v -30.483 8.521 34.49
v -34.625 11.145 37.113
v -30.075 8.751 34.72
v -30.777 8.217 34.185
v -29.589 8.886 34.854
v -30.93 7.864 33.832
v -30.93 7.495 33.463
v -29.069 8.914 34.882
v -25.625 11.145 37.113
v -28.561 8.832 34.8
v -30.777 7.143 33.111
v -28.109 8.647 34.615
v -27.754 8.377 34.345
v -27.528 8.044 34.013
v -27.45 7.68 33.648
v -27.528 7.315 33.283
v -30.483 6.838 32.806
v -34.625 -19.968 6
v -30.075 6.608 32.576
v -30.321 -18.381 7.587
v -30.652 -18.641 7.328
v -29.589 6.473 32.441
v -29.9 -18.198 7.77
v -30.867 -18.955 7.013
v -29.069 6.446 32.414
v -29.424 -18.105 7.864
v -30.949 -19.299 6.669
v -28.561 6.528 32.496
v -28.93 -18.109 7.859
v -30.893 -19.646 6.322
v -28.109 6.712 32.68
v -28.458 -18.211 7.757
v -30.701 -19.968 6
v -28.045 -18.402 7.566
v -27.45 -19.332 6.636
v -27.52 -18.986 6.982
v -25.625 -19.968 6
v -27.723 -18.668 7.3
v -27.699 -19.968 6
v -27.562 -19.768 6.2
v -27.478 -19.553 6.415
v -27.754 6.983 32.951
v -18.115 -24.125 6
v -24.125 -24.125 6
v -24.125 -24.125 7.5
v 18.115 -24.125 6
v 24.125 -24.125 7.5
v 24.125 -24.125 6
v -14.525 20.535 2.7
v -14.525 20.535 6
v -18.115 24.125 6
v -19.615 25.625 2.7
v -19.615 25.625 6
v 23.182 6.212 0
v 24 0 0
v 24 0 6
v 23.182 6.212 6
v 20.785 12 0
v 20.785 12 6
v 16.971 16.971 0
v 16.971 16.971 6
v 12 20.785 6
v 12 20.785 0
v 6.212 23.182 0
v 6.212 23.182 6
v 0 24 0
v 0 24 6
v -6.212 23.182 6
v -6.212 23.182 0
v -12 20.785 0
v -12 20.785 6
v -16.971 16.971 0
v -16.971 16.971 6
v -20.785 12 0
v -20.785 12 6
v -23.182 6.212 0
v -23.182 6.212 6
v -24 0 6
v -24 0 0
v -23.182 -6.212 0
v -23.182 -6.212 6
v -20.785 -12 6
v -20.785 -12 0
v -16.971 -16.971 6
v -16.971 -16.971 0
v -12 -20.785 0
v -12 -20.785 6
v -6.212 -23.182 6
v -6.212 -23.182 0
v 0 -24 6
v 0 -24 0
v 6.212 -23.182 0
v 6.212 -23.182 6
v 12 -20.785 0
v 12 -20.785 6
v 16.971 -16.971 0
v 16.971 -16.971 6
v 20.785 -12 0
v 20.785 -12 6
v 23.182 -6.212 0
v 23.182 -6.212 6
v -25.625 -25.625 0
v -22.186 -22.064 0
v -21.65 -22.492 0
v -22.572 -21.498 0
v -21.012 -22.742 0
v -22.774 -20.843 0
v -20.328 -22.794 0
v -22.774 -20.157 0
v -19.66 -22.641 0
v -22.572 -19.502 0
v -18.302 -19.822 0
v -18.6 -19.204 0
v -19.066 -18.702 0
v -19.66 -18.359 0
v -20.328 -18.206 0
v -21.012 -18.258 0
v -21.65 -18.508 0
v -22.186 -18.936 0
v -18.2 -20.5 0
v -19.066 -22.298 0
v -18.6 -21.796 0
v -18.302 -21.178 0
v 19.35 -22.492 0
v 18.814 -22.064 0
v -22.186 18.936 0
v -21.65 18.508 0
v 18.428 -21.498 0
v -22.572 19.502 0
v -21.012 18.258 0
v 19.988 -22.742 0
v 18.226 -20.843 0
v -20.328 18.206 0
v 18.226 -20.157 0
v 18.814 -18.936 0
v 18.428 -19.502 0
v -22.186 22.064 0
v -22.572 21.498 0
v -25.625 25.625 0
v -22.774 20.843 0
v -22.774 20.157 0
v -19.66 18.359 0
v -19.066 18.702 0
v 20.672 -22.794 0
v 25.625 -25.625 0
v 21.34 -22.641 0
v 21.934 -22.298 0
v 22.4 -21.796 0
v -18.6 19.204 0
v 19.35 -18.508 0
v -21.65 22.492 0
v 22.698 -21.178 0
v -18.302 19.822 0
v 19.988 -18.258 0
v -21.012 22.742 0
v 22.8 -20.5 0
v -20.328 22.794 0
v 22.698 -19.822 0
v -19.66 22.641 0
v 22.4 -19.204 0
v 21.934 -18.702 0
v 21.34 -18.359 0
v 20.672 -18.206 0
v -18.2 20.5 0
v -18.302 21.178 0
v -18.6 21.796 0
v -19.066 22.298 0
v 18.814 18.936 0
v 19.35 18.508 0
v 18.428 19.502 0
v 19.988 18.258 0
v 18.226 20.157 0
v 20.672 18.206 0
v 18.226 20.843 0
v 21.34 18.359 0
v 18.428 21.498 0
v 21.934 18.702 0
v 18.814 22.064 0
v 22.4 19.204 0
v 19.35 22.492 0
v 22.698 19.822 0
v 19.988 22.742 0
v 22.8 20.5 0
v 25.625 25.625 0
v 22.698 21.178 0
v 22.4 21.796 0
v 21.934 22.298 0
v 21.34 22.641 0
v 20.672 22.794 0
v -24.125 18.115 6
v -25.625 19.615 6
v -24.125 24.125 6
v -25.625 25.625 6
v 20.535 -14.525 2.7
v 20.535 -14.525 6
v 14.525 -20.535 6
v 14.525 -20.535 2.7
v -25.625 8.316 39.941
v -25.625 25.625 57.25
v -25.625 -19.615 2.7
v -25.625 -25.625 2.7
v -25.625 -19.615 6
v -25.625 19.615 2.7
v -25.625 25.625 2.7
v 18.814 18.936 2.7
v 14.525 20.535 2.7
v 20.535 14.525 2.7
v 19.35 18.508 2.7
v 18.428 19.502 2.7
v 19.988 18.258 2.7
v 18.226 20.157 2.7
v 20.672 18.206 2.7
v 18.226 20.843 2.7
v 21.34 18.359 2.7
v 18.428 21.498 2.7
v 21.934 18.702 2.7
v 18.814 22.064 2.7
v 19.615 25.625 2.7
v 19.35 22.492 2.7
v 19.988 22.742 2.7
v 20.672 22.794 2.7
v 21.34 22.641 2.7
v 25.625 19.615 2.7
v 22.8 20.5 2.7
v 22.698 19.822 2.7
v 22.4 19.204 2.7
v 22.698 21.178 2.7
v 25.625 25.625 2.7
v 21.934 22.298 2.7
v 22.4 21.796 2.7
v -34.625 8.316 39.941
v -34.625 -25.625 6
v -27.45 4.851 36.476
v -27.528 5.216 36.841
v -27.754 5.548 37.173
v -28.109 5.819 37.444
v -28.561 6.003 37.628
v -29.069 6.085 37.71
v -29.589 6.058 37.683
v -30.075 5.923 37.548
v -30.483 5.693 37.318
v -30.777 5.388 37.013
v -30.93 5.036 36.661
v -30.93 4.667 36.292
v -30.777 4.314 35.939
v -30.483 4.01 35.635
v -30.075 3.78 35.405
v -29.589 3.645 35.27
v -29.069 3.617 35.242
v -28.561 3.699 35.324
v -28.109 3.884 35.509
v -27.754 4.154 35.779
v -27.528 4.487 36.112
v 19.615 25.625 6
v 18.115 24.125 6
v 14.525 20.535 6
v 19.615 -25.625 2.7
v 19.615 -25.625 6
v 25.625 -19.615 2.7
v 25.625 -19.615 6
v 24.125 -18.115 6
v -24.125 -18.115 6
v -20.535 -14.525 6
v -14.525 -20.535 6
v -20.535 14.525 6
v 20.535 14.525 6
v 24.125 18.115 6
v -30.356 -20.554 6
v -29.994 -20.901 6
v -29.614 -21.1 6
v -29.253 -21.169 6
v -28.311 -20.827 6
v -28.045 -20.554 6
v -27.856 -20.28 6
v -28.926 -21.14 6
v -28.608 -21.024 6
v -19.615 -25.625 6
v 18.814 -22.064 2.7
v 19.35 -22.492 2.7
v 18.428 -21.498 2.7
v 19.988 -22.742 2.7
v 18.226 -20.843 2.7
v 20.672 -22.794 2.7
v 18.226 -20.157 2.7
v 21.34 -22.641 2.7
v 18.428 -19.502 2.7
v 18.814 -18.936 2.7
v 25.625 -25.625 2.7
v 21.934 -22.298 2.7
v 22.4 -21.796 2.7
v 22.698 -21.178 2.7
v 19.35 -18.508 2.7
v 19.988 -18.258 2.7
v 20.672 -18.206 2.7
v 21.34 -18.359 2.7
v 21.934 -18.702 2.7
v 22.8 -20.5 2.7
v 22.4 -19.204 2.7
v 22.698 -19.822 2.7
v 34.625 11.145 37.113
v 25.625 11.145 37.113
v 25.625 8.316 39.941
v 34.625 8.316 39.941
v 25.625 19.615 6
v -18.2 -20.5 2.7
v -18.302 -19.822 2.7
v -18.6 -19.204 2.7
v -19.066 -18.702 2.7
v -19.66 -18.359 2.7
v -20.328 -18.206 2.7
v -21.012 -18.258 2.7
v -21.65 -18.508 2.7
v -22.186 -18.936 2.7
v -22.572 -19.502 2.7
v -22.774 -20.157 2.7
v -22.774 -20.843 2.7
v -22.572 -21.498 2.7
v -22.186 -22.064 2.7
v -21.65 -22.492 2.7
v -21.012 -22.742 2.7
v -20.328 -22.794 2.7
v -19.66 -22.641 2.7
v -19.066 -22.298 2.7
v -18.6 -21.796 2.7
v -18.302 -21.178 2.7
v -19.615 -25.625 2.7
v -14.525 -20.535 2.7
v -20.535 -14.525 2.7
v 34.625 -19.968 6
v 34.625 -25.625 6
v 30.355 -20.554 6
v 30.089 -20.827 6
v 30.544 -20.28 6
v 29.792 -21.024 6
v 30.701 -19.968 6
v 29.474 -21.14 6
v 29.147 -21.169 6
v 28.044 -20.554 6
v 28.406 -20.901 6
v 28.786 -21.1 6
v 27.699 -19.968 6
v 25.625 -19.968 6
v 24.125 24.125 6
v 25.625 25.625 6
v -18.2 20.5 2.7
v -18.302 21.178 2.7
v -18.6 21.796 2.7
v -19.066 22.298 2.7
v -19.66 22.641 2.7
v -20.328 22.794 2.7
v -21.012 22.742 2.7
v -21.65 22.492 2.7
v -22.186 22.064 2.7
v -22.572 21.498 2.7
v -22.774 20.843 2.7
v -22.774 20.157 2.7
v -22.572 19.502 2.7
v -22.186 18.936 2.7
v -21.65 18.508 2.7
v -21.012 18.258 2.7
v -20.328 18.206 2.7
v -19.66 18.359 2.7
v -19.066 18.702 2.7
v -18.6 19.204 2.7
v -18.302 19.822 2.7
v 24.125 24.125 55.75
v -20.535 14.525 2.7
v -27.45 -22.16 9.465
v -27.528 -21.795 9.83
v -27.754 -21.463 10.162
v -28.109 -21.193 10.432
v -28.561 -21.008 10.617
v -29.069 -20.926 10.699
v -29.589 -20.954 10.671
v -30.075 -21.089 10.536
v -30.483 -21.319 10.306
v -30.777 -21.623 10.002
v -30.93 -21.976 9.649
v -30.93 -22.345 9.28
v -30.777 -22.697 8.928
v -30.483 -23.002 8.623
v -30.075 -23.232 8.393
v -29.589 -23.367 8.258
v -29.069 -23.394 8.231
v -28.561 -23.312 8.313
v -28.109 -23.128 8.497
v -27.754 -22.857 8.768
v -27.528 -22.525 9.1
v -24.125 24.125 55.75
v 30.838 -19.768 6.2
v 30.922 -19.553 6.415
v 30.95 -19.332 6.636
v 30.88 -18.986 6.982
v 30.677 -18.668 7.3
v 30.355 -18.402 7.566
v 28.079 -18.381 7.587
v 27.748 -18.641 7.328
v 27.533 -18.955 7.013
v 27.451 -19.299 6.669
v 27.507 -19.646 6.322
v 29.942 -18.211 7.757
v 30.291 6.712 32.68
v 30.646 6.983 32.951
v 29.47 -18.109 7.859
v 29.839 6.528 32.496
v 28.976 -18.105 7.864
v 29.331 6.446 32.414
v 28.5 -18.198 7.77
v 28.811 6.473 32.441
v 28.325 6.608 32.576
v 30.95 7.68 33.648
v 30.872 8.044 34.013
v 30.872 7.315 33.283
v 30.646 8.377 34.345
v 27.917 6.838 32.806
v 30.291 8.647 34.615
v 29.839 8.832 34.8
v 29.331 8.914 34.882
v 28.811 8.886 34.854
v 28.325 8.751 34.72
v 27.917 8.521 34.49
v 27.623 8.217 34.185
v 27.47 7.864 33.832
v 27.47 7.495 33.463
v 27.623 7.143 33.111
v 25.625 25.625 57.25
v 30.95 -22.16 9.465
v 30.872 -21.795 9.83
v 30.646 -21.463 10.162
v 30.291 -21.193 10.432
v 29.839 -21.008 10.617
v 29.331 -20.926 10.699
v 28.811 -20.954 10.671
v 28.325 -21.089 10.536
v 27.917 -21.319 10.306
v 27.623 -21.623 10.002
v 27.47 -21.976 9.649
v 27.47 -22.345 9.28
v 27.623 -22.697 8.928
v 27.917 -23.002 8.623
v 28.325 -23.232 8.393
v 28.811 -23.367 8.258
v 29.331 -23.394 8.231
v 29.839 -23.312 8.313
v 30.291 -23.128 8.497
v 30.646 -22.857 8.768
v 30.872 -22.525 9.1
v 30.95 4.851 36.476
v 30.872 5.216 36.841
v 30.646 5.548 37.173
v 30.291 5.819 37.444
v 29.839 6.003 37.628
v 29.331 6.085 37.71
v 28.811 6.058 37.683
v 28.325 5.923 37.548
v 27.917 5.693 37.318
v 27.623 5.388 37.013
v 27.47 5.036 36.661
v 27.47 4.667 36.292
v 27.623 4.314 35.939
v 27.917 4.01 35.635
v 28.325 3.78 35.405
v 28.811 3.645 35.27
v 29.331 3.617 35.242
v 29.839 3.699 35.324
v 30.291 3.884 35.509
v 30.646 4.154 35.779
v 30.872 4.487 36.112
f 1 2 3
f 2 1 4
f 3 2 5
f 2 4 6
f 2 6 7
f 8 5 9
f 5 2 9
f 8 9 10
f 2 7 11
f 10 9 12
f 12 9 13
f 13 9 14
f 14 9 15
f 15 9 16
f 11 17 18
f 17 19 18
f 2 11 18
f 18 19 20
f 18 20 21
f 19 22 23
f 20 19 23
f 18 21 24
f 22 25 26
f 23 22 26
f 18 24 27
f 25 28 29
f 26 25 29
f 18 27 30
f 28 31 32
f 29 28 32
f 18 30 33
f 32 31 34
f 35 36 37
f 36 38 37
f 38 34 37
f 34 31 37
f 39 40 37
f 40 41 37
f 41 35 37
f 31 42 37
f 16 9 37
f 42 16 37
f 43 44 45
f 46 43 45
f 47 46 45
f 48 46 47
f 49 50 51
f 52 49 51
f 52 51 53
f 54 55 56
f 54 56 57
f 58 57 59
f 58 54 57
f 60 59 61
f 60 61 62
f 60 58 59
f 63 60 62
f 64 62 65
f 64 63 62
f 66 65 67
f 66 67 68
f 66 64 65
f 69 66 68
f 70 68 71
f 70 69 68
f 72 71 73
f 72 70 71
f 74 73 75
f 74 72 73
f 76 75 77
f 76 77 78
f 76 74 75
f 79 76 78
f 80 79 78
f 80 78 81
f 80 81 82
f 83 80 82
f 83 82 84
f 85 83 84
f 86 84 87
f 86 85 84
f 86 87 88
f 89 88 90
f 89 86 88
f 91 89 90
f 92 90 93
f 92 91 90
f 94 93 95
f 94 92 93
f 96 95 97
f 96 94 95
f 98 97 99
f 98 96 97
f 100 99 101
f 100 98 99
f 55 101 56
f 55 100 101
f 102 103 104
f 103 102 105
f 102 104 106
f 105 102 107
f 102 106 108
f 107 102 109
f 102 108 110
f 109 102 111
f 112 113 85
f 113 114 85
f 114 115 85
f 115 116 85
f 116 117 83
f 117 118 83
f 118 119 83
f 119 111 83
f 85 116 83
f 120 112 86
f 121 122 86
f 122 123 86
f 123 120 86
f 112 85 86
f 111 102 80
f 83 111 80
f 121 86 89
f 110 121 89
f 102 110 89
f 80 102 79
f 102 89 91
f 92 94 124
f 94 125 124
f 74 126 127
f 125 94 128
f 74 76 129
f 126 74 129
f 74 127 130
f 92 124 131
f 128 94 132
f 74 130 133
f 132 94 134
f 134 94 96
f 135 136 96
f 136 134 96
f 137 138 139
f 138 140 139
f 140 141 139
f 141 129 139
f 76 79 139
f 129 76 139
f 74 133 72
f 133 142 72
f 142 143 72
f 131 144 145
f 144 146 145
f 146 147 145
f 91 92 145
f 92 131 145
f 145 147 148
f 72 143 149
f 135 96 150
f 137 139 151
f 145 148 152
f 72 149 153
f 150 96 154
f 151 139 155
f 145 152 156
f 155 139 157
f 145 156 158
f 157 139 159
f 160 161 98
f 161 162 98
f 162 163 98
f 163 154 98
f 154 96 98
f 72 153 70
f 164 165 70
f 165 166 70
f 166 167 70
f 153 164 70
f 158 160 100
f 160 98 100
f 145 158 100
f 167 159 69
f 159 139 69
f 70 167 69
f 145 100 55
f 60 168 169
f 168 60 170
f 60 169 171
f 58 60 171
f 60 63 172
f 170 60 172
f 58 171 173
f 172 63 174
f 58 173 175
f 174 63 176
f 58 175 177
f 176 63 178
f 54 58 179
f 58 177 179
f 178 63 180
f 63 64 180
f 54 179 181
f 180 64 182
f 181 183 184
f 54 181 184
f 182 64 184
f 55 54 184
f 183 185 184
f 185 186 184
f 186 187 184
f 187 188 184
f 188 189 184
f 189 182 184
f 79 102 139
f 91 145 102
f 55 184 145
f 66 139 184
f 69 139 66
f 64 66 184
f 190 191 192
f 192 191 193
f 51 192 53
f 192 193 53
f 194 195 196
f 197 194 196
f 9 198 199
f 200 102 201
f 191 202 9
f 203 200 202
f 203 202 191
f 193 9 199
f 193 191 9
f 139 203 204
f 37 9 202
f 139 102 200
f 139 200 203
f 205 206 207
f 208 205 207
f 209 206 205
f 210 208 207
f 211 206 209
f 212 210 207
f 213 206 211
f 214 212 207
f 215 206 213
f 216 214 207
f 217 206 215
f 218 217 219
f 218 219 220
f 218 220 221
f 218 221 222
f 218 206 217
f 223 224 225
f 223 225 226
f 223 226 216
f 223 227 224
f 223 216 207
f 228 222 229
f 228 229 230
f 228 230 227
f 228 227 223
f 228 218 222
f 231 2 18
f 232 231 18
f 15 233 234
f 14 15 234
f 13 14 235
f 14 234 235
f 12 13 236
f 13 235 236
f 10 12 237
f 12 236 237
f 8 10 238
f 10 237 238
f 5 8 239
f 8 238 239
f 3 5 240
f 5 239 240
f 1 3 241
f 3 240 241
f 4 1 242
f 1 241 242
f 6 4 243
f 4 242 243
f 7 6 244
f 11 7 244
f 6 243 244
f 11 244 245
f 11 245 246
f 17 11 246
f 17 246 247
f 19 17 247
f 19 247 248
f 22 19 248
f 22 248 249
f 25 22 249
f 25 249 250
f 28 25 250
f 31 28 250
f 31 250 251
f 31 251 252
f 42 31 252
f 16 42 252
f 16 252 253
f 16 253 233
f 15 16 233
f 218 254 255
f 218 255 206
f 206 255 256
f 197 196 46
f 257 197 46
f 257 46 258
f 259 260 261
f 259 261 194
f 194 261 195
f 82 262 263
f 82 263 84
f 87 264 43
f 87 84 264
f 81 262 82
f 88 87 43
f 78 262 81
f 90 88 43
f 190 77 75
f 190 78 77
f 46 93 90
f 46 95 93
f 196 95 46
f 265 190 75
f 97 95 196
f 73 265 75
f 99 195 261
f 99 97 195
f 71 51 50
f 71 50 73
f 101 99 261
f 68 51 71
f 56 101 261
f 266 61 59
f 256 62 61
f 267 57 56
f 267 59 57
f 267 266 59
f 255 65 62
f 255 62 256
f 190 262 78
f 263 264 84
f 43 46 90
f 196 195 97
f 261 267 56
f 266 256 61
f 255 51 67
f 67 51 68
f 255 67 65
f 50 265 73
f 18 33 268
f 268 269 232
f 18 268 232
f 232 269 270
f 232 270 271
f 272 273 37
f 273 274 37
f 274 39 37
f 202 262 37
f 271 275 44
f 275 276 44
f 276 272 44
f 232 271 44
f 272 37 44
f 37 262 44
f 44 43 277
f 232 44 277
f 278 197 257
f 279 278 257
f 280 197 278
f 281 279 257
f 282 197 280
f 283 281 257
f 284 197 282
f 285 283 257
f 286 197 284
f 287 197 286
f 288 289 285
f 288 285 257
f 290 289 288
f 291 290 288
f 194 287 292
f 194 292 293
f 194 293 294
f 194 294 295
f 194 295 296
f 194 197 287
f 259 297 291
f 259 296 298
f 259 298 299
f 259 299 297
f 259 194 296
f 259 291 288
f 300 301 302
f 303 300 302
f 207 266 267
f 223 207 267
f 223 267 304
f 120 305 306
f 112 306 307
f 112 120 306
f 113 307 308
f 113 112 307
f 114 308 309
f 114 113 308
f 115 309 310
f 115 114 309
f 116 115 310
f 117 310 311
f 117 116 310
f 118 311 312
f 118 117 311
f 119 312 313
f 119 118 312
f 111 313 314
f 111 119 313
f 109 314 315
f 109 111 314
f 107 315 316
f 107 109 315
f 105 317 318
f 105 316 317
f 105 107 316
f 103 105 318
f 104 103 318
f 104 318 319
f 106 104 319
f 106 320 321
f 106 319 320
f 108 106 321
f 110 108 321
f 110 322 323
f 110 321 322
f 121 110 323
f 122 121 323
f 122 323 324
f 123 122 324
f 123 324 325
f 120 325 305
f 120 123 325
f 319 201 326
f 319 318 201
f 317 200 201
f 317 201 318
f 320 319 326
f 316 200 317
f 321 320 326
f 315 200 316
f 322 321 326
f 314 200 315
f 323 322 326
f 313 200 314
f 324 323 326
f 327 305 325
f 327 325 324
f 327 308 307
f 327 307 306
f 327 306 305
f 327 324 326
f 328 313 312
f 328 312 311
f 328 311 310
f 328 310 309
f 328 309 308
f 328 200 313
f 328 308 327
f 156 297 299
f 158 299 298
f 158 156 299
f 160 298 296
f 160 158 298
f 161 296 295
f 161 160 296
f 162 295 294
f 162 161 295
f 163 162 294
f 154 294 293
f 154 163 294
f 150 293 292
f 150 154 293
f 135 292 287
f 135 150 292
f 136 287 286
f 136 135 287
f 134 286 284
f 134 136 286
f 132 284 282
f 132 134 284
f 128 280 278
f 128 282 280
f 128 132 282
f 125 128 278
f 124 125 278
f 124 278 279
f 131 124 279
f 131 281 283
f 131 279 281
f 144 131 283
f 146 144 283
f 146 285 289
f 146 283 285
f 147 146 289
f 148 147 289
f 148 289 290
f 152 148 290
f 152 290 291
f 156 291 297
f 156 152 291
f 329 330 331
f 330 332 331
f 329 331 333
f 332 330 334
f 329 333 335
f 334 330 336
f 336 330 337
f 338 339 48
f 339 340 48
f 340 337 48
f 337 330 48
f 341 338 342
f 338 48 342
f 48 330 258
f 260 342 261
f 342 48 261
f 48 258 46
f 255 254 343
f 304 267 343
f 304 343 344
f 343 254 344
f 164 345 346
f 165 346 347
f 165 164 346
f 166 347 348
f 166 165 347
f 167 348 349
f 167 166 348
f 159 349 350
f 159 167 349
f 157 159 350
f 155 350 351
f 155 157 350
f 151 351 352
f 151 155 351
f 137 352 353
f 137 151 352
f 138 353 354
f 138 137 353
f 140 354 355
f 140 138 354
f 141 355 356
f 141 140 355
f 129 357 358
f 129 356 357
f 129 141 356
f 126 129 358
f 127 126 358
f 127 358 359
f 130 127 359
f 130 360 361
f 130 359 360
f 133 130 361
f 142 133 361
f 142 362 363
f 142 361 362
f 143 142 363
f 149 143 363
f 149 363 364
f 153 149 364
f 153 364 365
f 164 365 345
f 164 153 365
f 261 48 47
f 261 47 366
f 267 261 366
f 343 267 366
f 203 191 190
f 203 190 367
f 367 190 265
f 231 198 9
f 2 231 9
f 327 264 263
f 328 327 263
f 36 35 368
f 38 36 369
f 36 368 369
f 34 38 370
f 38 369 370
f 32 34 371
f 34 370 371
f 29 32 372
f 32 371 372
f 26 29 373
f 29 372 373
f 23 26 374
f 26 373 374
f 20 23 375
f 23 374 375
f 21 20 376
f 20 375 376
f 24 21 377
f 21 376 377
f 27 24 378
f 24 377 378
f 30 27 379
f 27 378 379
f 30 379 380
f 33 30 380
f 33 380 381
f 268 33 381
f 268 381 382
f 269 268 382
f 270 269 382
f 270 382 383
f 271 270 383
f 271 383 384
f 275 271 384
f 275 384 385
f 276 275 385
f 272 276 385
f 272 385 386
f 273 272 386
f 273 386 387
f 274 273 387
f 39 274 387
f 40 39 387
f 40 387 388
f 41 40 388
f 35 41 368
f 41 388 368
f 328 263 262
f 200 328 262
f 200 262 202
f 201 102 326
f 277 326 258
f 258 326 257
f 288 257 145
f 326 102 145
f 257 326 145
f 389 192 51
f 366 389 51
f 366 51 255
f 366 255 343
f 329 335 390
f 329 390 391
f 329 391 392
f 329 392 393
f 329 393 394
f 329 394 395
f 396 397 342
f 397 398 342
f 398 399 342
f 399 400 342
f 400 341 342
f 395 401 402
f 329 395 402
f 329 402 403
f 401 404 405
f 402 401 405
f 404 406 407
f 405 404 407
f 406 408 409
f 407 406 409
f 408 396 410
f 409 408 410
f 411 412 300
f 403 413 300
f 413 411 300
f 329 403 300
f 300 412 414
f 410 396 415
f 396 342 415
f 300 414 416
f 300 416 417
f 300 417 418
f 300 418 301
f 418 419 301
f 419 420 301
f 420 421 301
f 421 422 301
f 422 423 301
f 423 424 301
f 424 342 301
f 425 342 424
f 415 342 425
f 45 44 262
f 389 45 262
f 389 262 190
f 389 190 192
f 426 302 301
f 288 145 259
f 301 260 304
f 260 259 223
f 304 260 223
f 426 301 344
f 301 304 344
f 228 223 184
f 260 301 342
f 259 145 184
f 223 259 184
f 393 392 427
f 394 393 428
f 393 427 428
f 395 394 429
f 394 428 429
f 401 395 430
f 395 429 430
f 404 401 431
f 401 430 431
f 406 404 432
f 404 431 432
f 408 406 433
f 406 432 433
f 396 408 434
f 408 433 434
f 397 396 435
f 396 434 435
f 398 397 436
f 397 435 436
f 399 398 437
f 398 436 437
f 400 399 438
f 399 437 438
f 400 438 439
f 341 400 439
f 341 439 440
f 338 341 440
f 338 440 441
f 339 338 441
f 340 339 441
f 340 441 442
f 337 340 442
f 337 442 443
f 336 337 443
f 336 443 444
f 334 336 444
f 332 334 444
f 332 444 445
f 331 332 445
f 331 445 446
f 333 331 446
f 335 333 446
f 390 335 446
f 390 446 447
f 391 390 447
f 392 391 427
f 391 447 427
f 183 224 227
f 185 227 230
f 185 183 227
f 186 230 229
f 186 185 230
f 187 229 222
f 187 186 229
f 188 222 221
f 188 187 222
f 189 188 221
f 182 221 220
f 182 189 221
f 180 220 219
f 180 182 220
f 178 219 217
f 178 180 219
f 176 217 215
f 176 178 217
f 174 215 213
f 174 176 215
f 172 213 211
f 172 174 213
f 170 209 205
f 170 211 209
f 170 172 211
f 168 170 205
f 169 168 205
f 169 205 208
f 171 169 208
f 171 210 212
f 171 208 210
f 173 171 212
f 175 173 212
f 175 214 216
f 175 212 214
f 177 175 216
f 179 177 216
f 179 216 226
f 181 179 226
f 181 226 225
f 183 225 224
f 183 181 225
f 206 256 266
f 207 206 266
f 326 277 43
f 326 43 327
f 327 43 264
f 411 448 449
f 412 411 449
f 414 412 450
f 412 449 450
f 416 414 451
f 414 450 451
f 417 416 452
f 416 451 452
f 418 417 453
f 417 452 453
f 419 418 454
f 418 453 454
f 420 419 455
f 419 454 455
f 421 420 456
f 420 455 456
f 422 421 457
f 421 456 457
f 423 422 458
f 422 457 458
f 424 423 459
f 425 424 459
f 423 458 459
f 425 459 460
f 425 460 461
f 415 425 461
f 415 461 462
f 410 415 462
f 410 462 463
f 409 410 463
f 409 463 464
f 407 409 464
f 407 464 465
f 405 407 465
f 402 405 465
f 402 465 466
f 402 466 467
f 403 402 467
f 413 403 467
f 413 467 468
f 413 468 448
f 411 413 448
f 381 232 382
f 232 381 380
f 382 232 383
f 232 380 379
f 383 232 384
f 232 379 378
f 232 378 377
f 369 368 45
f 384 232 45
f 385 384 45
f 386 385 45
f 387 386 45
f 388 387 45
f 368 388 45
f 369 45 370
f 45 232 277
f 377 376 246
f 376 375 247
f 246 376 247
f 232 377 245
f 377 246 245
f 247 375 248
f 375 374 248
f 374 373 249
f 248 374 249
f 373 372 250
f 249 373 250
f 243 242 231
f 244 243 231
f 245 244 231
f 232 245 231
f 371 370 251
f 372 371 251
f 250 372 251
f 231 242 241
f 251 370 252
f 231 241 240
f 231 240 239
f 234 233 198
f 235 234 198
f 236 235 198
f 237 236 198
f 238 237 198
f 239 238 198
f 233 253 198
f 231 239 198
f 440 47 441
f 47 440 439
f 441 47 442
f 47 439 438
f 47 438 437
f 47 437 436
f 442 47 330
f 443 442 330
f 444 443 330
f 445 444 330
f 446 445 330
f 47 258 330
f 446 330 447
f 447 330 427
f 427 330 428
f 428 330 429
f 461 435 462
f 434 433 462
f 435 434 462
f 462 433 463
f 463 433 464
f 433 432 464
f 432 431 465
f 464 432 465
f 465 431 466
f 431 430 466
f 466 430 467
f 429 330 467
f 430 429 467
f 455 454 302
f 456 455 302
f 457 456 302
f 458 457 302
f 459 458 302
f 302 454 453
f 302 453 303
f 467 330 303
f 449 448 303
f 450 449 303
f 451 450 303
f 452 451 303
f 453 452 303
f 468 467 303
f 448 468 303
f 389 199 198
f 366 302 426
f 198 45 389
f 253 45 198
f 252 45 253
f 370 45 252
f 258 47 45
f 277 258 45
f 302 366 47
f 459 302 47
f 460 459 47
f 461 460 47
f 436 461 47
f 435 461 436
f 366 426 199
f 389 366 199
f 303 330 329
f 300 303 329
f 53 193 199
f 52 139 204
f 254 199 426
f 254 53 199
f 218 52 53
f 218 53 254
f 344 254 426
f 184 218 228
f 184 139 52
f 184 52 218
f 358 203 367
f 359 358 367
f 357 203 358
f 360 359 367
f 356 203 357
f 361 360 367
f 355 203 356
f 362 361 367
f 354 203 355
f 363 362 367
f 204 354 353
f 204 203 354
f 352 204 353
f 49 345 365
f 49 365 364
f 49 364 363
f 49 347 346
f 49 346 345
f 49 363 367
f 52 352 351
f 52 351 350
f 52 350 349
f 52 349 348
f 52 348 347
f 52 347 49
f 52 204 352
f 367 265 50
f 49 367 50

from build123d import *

# Parameters (mm, degrees)
F0_W      = 51.25
F0_H      = 51.25
F0_R      = 2.3
F0_R_2    = 24
F1_DEPTH  = 6
F3_DEPTH  = 3.3
F4_W      = 51.25
F4_H      = 51.25
F4_W_2    = 48.25
F4_H_2    = 48.25
F5_DEPTH  = 55
F7_DEPTH  = 51.251
F9_DEPTH  = 9
F11_DEPTH = 9
F12_R     = 1.75
F13_DEPTH = 40.482863


with BuildPart() as f1:
    # F0 (on Top) → F1 (new body)
    with BuildSketch(Plane.XY):
        Rectangle(F0_W, F0_H)
        with Locations((-20.5, -20.5)):
            Circle(F0_R, mode=Mode.SUBTRACT)
        with Locations((20.5, -20.5)):
            Circle(F0_R, mode=Mode.SUBTRACT)
        with Locations((-20.5, 20.5)):
            Circle(F0_R, mode=Mode.SUBTRACT)
        Circle(F0_R_2, mode=Mode.SUBTRACT)
        with Locations((20.5, 20.5)):
            Circle(F0_R, mode=Mode.SUBTRACT)
    extrude(amount=F1_DEPTH)

    # F2 (on face) → F3 (cut)
    with BuildSketch(Plane.XY.offset(6)):
        Polygon((-25.625, 25.625), (-25.625, 19.614592), (-20.535355, 14.524948), (-14.524948, 20.535355), (-19.614592, 25.625), align=None)
        Polygon((19.614592, 25.625), (14.524948, 20.535355), (20.535355, 14.524948), (25.625, 19.614592), (25.625, 25.625), align=None)
        Polygon((25.625, -25.625), (25.625, -19.614592), (20.535355, -14.524948), (14.524948, -20.535355), (19.614592, -25.625), align=None)
        Polygon((-14.524948, -20.535355), (-20.535355, -14.524948), (-25.625, -19.614592), (-25.625, -25.625), (-19.614592, -25.625), align=None)
    extrude(amount=-F3_DEPTH, mode=Mode.SUBTRACT)

    # F4 (on face) → F5 (join)
    with BuildSketch(Plane.XY.offset(6)):
        Rectangle(F4_W, F4_H)
        Rectangle(F4_W_2, F4_H_2, mode=Mode.SUBTRACT)
    extrude(amount=F5_DEPTH)

    # F6 (on face) → F7 (cut, through all)
    with BuildSketch(Plane.YZ.offset(25.625)):
        Polygon((-25.625, 61), (-25.625, 6), (25.625, 57.25), (25.625, 61), align=None)
    extrude(amount=-F7_DEPTH, mode=Mode.SUBTRACT)

    # F8 (on face) → F9 (join)
    with BuildSketch(Plane.YZ.offset(25.625)):
        Polygon((8.316125, 39.941125), (-25.625, 6), (-19.968146, 6), (11.144553, 37.112698), align=None)
    extrude(amount=F9_DEPTH)

    # F10 (on face) → F11 (join)
    with BuildSketch(Plane(origin=(-25.625, 0, 0), x_dir=(0, -1, 0), z_dir=(-1, 0, 0))):
        Polygon((19.968146, 6), (25.625, 6), (-8.316125, 39.941125), (-11.144553, 37.112698), align=None)
    extrude(amount=F11_DEPTH)

    # F12 (on face) → F13 (cut, through all)
    with BuildSketch(Plane(origin=(0, -15.8125, 15.8125), x_dir=(1, 0, 0), z_dir=(0, -0.707107, 0.707107))):
        with Locations((29.2, 29.223029)):
            Circle(F12_R)
        with Locations((29.2, -8.976971)):
            Circle(F12_R)
        with Locations((-29.2, 29.223029)):
            Circle(F12_R)
        with Locations((-29.2, -8.976971)):
            Circle(F12_R)
    extrude(amount=-F13_DEPTH, mode=Mode.SUBTRACT)


solid = f1.part
